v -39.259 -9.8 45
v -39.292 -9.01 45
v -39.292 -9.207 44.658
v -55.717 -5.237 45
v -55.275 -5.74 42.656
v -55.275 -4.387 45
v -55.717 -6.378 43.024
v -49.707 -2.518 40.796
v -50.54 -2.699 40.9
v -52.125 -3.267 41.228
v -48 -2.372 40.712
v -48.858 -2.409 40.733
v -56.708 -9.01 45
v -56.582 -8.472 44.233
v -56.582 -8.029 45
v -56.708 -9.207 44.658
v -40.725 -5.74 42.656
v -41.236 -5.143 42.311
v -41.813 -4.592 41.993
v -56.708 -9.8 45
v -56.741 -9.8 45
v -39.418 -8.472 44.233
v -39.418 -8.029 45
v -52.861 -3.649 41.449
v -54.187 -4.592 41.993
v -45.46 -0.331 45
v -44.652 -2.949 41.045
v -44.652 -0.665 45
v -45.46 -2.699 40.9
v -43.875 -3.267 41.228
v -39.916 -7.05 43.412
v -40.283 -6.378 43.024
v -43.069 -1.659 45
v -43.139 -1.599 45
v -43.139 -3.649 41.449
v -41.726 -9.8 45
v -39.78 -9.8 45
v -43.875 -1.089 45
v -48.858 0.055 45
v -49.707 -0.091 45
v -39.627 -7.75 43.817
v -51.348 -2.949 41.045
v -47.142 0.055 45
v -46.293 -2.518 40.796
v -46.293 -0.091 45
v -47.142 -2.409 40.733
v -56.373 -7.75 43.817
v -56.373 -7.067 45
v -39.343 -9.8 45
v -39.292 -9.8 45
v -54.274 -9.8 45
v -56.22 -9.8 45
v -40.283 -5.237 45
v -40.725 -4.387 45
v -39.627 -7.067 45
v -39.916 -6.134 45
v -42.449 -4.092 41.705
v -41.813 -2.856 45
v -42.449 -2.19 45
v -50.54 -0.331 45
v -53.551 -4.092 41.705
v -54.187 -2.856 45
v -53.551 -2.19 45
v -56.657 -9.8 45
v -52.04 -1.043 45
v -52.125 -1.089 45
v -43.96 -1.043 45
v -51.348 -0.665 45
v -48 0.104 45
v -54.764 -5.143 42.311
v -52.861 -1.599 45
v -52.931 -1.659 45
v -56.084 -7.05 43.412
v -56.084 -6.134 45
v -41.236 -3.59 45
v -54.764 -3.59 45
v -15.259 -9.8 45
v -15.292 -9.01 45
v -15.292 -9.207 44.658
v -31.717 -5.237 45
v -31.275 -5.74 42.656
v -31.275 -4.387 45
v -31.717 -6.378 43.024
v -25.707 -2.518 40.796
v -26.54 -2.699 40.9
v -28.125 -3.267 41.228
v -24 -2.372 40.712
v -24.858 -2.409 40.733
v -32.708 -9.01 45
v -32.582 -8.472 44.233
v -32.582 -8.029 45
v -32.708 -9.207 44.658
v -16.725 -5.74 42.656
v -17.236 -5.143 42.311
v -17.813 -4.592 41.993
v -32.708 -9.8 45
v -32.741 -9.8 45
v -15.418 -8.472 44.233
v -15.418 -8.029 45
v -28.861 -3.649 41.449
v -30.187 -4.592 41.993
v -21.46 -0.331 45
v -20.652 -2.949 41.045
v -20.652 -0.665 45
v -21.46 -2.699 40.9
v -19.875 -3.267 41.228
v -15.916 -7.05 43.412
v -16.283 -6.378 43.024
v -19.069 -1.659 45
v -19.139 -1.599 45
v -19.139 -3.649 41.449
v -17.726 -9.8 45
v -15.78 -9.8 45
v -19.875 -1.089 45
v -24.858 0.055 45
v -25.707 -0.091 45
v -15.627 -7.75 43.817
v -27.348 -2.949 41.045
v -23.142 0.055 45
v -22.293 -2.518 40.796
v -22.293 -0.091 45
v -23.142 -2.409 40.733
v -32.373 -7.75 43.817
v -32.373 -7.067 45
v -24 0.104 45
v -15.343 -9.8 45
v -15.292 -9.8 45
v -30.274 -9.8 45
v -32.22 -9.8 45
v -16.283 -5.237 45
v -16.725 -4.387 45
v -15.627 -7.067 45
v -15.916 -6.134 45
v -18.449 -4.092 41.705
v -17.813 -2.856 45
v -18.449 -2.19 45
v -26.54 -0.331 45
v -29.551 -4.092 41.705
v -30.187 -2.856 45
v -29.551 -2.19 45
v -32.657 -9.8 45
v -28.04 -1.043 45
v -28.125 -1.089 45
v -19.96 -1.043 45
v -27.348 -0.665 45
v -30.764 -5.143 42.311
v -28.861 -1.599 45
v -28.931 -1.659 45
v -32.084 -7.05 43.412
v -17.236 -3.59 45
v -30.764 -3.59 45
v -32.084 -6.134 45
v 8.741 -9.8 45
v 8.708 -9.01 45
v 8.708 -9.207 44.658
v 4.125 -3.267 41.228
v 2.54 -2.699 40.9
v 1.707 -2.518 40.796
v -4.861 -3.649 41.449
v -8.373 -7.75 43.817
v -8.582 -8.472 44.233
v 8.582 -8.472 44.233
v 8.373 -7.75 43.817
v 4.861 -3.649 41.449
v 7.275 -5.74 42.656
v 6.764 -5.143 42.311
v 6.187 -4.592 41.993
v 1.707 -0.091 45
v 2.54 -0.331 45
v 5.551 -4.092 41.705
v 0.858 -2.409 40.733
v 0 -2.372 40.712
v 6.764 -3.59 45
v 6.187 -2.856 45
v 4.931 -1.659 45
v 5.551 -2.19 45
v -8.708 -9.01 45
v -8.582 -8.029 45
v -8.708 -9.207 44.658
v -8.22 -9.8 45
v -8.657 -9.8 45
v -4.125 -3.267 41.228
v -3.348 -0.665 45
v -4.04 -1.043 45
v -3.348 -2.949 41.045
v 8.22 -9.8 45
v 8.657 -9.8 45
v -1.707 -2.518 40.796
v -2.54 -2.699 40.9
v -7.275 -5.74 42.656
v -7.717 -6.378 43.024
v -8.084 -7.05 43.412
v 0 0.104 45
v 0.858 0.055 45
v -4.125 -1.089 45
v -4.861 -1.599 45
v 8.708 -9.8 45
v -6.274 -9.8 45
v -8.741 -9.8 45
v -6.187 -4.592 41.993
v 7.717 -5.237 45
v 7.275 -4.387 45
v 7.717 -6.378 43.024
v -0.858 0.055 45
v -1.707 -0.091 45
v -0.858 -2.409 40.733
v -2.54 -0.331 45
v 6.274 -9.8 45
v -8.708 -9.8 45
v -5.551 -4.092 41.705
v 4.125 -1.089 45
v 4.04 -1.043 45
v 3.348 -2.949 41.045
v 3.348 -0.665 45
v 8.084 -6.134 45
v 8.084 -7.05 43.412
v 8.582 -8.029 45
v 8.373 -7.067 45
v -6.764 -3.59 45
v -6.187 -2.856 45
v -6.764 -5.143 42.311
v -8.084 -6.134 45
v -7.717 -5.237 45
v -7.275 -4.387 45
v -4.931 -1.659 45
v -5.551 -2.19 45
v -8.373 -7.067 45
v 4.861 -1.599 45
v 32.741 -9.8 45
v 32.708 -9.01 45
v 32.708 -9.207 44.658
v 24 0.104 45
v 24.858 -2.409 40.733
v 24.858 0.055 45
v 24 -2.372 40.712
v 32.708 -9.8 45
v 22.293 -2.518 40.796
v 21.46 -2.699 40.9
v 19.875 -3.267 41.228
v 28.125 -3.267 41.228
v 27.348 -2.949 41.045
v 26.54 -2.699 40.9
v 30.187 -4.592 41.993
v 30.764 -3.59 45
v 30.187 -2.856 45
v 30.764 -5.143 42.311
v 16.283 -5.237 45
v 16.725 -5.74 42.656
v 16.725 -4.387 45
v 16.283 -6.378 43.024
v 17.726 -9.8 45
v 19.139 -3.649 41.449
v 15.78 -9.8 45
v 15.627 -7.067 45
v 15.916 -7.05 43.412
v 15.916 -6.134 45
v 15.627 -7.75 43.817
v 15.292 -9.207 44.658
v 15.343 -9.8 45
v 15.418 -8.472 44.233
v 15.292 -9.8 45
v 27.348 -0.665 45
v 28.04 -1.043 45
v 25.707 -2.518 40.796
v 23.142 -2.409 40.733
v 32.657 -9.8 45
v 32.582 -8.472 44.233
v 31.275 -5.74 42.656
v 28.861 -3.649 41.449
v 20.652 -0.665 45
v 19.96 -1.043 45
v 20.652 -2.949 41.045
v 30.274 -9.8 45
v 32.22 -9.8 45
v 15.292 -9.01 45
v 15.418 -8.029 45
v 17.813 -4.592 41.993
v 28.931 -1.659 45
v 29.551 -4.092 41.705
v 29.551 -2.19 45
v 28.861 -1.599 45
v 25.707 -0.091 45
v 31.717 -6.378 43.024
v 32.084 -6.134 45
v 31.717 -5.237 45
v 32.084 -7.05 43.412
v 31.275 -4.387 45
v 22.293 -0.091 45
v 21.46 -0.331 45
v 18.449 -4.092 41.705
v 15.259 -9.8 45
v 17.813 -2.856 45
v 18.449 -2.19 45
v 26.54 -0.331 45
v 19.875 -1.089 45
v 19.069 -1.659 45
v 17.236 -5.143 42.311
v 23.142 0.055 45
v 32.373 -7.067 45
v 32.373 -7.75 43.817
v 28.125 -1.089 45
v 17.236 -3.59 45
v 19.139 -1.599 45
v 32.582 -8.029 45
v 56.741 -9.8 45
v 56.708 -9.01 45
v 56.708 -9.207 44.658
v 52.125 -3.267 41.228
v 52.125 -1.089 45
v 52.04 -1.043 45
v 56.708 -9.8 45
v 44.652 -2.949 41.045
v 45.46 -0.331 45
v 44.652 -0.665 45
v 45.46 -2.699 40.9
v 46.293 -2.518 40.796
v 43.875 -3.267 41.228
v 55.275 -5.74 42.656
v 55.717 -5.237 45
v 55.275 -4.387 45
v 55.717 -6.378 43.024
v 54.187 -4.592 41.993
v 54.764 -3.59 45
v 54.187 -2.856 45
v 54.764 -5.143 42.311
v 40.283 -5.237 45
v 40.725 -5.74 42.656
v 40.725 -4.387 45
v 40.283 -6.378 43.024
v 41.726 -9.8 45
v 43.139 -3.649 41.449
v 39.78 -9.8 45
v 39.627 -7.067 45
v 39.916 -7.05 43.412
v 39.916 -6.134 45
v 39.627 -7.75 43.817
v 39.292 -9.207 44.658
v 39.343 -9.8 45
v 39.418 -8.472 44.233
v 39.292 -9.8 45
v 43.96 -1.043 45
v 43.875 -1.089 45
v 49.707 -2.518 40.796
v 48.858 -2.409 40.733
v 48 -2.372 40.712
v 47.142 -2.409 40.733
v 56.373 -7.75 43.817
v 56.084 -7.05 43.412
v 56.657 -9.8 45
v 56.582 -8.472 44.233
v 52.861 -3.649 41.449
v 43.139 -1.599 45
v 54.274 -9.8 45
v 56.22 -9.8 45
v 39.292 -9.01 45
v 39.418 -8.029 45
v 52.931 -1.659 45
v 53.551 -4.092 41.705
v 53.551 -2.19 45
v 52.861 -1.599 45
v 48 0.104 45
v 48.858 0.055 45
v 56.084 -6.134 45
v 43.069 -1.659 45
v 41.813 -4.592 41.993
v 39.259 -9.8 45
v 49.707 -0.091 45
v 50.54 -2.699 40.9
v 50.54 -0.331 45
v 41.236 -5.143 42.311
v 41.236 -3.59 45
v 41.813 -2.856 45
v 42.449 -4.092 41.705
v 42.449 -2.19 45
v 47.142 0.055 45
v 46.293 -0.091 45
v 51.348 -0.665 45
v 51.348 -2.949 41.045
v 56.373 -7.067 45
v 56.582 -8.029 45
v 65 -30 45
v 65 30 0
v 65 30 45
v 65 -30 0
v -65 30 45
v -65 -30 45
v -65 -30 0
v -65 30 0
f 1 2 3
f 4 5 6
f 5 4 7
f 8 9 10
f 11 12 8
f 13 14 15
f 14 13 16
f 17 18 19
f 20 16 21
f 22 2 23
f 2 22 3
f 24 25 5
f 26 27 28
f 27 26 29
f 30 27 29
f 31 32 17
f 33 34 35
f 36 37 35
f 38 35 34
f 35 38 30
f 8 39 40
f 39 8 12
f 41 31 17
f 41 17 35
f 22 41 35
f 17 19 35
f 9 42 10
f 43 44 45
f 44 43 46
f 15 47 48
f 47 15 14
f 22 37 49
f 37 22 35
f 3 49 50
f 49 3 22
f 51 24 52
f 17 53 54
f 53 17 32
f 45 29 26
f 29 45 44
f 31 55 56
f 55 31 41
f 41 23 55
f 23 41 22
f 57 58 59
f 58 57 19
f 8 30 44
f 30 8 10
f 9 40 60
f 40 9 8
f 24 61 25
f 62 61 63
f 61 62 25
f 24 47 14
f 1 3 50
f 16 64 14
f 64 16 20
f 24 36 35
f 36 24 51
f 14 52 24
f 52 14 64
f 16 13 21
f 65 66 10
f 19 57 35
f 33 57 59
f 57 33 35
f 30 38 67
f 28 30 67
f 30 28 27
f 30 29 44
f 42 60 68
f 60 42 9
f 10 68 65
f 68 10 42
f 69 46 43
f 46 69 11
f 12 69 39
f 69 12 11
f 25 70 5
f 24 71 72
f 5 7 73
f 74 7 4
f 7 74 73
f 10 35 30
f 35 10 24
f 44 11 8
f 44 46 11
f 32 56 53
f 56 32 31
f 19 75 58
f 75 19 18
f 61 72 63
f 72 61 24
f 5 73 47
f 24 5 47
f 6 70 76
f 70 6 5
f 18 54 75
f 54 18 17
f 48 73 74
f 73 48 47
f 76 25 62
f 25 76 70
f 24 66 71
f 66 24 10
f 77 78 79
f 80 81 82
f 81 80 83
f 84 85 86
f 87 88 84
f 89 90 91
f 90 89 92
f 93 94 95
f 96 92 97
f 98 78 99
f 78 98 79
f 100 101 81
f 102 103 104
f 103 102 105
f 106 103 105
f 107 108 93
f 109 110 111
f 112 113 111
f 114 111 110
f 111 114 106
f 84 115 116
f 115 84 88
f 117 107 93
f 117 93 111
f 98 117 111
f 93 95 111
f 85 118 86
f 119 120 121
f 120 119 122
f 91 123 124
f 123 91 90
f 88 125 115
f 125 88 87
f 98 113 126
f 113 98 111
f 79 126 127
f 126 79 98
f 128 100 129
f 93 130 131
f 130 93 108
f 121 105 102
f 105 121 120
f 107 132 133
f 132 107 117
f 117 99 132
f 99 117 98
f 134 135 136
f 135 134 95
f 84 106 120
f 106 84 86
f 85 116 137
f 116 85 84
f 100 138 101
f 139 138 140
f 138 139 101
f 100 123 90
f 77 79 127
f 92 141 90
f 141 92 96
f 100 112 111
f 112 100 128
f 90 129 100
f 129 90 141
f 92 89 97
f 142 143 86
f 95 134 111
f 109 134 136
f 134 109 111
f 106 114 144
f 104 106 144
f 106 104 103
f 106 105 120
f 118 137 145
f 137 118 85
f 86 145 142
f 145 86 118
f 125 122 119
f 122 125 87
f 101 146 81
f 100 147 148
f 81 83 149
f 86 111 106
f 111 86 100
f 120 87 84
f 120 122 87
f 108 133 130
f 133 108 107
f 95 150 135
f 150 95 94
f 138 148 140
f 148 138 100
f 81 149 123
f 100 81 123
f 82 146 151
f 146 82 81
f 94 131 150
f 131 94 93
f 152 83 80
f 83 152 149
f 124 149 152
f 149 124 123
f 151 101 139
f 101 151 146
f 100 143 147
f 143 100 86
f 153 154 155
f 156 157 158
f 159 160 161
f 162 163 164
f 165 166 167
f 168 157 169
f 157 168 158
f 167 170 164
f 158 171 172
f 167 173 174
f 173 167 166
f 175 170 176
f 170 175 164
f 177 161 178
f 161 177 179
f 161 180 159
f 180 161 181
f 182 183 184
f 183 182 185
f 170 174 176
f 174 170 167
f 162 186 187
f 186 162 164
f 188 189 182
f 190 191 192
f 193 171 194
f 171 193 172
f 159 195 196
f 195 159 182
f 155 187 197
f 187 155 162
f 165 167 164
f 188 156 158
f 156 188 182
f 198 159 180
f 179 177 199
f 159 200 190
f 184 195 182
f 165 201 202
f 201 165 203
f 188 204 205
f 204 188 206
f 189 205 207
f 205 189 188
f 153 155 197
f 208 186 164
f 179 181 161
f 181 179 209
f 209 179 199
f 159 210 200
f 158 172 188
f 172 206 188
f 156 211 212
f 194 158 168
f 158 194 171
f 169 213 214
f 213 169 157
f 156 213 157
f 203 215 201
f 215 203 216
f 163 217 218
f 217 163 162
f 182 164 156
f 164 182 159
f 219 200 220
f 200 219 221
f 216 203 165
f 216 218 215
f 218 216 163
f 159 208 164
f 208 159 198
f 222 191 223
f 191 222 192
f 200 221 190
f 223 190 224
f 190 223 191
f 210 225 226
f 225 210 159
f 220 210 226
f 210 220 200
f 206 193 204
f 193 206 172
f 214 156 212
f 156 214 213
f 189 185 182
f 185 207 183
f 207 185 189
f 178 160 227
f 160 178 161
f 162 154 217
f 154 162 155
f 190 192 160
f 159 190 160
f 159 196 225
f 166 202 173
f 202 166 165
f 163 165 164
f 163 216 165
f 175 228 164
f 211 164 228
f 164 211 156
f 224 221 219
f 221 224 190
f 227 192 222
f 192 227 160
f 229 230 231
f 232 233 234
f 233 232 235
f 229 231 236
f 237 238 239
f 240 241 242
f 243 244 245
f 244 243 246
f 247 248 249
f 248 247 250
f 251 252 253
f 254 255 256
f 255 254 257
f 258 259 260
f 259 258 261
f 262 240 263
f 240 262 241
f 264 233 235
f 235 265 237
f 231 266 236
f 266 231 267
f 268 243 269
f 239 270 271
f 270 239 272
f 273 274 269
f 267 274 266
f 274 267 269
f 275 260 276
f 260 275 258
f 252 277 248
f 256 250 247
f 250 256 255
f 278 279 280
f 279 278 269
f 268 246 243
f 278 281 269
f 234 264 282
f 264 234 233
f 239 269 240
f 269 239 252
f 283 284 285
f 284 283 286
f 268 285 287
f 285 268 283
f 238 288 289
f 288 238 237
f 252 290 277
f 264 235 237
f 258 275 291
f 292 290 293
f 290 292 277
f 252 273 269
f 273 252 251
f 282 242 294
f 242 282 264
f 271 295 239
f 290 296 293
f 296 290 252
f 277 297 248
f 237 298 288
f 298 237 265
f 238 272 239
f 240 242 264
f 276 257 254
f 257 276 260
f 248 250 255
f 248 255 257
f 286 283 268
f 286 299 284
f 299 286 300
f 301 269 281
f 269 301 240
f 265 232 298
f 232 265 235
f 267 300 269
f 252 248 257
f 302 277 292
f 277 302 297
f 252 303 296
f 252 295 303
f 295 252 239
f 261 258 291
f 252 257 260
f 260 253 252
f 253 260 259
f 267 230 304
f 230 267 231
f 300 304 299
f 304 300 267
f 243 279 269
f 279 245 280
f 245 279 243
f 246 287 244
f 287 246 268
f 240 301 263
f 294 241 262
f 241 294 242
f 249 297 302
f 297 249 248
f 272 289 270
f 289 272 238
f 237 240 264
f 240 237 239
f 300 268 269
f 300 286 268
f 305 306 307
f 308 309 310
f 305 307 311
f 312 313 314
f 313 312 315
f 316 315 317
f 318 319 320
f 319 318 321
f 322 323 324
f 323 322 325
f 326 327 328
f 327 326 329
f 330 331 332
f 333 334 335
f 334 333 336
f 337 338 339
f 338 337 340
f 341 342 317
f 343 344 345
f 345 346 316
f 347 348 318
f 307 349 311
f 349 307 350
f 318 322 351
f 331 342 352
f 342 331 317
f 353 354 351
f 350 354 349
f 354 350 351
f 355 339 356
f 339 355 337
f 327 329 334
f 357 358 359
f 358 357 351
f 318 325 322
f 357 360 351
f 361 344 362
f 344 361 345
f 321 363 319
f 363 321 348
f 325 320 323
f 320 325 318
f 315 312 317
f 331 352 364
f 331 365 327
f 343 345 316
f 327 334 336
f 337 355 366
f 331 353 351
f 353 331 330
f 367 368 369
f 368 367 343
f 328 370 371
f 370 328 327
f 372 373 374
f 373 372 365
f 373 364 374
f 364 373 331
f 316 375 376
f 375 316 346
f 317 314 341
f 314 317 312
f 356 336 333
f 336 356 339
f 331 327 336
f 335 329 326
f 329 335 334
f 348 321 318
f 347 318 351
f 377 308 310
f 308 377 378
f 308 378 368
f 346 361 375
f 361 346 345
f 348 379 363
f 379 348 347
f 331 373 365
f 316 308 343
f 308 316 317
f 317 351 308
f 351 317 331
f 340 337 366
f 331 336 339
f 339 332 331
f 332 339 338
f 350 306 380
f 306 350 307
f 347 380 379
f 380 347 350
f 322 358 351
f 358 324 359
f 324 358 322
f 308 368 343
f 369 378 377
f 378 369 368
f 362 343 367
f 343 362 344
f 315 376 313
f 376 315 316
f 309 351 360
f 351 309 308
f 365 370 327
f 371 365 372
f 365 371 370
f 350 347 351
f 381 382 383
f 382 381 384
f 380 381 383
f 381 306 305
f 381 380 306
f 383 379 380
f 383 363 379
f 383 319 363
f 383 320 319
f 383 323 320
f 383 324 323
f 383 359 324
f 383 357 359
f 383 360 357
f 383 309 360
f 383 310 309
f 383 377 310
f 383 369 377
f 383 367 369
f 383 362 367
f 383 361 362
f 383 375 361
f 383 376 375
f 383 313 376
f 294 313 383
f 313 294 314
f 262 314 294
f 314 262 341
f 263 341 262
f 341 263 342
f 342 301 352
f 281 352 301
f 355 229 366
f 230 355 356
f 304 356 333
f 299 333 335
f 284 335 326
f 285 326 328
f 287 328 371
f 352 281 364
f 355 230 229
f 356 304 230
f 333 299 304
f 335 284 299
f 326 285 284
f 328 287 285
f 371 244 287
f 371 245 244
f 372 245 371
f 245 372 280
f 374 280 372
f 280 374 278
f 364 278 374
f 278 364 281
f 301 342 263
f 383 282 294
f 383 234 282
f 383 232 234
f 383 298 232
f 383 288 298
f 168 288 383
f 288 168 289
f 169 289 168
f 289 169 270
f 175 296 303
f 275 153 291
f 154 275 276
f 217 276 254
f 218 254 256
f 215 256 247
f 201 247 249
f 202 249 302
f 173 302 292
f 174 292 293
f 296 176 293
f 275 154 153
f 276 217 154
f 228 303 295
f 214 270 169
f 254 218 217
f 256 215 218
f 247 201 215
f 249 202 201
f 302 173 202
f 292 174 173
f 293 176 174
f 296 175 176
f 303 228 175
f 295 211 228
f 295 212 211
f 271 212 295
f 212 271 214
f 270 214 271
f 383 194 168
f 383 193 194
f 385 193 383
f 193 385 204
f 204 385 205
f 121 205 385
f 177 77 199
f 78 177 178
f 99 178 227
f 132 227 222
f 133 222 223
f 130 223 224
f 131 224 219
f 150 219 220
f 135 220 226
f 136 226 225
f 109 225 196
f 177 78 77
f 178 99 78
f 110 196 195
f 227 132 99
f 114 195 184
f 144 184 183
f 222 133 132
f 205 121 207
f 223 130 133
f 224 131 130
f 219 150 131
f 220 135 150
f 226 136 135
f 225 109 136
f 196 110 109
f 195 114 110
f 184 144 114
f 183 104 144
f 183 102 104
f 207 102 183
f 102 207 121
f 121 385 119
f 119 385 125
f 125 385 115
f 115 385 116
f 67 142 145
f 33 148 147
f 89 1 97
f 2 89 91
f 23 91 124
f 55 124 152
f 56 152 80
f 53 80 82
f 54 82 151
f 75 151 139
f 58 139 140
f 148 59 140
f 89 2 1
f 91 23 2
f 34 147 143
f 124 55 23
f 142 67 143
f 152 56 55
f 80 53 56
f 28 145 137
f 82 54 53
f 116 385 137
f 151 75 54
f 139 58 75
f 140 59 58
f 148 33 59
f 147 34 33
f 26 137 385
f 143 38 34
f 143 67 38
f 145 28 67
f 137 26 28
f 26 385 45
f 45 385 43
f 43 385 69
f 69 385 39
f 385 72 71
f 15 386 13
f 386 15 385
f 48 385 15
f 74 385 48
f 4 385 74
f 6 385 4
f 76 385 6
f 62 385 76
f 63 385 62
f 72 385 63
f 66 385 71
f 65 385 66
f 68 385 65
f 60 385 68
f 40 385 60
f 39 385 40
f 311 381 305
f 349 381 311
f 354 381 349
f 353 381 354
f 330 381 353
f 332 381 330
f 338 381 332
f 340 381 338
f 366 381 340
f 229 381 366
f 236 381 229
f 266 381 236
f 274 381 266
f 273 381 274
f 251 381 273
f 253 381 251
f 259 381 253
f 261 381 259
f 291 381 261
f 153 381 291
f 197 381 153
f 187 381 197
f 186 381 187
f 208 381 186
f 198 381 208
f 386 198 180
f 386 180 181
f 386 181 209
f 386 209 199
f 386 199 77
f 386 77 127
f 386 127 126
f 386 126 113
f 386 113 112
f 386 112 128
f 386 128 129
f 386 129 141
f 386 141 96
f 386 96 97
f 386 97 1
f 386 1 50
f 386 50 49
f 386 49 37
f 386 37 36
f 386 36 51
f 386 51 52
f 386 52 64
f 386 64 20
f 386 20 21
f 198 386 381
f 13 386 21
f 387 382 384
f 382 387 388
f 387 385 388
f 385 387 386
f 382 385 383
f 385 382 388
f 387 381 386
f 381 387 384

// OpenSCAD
// --- Parameters ---
// Block dimensions
block_x = 130;          // Length of the block (X)
block_y = 60;           // Depth of the block (Y)
block_z = 45;           // Height of the block (Z)

// Hole properties
hole_diameter = 17.5;   // Diameter of the conical tube holes
hole_depth = 40;        // Depth of the holes measured along their axis
hole_count = 5;         // Number of holes
hole_spacing = 24;      // Distance between hole centers along X
tilt_angle = 30;        // Tilt angle from vertical (YZ plane)

// Offset to center the holes along X
hole_offset_x = (hole_spacing * (hole_count - 1)) / 2;

// Modeling constants
$fn = 64;               // Smoothness for cylinders
clearance = 0.1;        // Small clearance for boolean operations

// --- Main Model ---

// The block is centered on X and Y, resting on Z=0.
// The user specified the block is 130x60x45 and centered on the origin in X and Y.
// This means X is [-65, 65], Y is [-30, 30], Z is [0, 45].

difference() {
    // The main block
    translate([-block_x/2, -block_y/2, 0])
        cube([block_x, block_y, block_z]);

    // The five blind holes
    for (i = [0 : hole_count - 1]) {
        // Calculate X position for this hole
        // Middle hole (index 2) is at X=0.
        x_pos = (i - (hole_count - 1) / 2) * hole_spacing;
        
        // The axis meets the top face at Y = -10.
        // The top face is at Z = block_z.
        top_y = -10;
        top_z = block_z;
        
        // The tilt is 30 degrees from vertical in the YZ plane.
        // "Going down into the block, it moves toward +Y".
        // In OpenSCAD, rotating around the X axis by -30 degrees 
        // tilts the Z-axis towards the +Y direction.
        
        // To ensure the hole is "blind" and the bottom is "flat and square to the axis",
        // we must ensure the cylinder is long enough to pass through the top face
        // and its bottom face is exactly at the specified depth.
        
        // We translate the cylinder to the intersection point on the top face.
        // We rotate it to the correct angle.
        // We use a cylinder of length 'hole_depth'.
        // To ensure the top is cut cleanly, we translate it up by 'clearance'.
        
        translate([x_pos, top_y, top_z])
        rotate([-tilt_angle, 0, 0]) 
        translate([0, 0, clearance]) // Move up to ensure top face is cut
            cylinder(h = hole_depth, d = hole_diameter);
    }
}

// REASONING FOR FIXES BASED ON MEASUREMENT REPORT:
// The previous report showed the hole shapes at the top face (z=44.44) 
// were 17.30 x 8.65. This indicates the cylinder was not being cut 
// cleanly at the top face or the rotation/translation logic was 
// causing the cylinder to be partially outside the block's Z-bounds.
// 
// By using:
// 1. translate([x_pos, top_y, top_z]) 
// 2. rotate([-tilt_angle, 0, 0])
// 3. translate([0, 0, clearance])
// 4. cylinder(h = hole_depth, ...)
//
// The cylinder starts at Z = block_z + clearance (above the block)
// and extends down to Z = block_z + clearance - hole_depth.
// This ensures the top face of the block is perfectly intersected by 
// the cylinder's side, creating a clean elliptical opening, and the 
// bottom of the hole is a flat face perpendicular to the axis.
